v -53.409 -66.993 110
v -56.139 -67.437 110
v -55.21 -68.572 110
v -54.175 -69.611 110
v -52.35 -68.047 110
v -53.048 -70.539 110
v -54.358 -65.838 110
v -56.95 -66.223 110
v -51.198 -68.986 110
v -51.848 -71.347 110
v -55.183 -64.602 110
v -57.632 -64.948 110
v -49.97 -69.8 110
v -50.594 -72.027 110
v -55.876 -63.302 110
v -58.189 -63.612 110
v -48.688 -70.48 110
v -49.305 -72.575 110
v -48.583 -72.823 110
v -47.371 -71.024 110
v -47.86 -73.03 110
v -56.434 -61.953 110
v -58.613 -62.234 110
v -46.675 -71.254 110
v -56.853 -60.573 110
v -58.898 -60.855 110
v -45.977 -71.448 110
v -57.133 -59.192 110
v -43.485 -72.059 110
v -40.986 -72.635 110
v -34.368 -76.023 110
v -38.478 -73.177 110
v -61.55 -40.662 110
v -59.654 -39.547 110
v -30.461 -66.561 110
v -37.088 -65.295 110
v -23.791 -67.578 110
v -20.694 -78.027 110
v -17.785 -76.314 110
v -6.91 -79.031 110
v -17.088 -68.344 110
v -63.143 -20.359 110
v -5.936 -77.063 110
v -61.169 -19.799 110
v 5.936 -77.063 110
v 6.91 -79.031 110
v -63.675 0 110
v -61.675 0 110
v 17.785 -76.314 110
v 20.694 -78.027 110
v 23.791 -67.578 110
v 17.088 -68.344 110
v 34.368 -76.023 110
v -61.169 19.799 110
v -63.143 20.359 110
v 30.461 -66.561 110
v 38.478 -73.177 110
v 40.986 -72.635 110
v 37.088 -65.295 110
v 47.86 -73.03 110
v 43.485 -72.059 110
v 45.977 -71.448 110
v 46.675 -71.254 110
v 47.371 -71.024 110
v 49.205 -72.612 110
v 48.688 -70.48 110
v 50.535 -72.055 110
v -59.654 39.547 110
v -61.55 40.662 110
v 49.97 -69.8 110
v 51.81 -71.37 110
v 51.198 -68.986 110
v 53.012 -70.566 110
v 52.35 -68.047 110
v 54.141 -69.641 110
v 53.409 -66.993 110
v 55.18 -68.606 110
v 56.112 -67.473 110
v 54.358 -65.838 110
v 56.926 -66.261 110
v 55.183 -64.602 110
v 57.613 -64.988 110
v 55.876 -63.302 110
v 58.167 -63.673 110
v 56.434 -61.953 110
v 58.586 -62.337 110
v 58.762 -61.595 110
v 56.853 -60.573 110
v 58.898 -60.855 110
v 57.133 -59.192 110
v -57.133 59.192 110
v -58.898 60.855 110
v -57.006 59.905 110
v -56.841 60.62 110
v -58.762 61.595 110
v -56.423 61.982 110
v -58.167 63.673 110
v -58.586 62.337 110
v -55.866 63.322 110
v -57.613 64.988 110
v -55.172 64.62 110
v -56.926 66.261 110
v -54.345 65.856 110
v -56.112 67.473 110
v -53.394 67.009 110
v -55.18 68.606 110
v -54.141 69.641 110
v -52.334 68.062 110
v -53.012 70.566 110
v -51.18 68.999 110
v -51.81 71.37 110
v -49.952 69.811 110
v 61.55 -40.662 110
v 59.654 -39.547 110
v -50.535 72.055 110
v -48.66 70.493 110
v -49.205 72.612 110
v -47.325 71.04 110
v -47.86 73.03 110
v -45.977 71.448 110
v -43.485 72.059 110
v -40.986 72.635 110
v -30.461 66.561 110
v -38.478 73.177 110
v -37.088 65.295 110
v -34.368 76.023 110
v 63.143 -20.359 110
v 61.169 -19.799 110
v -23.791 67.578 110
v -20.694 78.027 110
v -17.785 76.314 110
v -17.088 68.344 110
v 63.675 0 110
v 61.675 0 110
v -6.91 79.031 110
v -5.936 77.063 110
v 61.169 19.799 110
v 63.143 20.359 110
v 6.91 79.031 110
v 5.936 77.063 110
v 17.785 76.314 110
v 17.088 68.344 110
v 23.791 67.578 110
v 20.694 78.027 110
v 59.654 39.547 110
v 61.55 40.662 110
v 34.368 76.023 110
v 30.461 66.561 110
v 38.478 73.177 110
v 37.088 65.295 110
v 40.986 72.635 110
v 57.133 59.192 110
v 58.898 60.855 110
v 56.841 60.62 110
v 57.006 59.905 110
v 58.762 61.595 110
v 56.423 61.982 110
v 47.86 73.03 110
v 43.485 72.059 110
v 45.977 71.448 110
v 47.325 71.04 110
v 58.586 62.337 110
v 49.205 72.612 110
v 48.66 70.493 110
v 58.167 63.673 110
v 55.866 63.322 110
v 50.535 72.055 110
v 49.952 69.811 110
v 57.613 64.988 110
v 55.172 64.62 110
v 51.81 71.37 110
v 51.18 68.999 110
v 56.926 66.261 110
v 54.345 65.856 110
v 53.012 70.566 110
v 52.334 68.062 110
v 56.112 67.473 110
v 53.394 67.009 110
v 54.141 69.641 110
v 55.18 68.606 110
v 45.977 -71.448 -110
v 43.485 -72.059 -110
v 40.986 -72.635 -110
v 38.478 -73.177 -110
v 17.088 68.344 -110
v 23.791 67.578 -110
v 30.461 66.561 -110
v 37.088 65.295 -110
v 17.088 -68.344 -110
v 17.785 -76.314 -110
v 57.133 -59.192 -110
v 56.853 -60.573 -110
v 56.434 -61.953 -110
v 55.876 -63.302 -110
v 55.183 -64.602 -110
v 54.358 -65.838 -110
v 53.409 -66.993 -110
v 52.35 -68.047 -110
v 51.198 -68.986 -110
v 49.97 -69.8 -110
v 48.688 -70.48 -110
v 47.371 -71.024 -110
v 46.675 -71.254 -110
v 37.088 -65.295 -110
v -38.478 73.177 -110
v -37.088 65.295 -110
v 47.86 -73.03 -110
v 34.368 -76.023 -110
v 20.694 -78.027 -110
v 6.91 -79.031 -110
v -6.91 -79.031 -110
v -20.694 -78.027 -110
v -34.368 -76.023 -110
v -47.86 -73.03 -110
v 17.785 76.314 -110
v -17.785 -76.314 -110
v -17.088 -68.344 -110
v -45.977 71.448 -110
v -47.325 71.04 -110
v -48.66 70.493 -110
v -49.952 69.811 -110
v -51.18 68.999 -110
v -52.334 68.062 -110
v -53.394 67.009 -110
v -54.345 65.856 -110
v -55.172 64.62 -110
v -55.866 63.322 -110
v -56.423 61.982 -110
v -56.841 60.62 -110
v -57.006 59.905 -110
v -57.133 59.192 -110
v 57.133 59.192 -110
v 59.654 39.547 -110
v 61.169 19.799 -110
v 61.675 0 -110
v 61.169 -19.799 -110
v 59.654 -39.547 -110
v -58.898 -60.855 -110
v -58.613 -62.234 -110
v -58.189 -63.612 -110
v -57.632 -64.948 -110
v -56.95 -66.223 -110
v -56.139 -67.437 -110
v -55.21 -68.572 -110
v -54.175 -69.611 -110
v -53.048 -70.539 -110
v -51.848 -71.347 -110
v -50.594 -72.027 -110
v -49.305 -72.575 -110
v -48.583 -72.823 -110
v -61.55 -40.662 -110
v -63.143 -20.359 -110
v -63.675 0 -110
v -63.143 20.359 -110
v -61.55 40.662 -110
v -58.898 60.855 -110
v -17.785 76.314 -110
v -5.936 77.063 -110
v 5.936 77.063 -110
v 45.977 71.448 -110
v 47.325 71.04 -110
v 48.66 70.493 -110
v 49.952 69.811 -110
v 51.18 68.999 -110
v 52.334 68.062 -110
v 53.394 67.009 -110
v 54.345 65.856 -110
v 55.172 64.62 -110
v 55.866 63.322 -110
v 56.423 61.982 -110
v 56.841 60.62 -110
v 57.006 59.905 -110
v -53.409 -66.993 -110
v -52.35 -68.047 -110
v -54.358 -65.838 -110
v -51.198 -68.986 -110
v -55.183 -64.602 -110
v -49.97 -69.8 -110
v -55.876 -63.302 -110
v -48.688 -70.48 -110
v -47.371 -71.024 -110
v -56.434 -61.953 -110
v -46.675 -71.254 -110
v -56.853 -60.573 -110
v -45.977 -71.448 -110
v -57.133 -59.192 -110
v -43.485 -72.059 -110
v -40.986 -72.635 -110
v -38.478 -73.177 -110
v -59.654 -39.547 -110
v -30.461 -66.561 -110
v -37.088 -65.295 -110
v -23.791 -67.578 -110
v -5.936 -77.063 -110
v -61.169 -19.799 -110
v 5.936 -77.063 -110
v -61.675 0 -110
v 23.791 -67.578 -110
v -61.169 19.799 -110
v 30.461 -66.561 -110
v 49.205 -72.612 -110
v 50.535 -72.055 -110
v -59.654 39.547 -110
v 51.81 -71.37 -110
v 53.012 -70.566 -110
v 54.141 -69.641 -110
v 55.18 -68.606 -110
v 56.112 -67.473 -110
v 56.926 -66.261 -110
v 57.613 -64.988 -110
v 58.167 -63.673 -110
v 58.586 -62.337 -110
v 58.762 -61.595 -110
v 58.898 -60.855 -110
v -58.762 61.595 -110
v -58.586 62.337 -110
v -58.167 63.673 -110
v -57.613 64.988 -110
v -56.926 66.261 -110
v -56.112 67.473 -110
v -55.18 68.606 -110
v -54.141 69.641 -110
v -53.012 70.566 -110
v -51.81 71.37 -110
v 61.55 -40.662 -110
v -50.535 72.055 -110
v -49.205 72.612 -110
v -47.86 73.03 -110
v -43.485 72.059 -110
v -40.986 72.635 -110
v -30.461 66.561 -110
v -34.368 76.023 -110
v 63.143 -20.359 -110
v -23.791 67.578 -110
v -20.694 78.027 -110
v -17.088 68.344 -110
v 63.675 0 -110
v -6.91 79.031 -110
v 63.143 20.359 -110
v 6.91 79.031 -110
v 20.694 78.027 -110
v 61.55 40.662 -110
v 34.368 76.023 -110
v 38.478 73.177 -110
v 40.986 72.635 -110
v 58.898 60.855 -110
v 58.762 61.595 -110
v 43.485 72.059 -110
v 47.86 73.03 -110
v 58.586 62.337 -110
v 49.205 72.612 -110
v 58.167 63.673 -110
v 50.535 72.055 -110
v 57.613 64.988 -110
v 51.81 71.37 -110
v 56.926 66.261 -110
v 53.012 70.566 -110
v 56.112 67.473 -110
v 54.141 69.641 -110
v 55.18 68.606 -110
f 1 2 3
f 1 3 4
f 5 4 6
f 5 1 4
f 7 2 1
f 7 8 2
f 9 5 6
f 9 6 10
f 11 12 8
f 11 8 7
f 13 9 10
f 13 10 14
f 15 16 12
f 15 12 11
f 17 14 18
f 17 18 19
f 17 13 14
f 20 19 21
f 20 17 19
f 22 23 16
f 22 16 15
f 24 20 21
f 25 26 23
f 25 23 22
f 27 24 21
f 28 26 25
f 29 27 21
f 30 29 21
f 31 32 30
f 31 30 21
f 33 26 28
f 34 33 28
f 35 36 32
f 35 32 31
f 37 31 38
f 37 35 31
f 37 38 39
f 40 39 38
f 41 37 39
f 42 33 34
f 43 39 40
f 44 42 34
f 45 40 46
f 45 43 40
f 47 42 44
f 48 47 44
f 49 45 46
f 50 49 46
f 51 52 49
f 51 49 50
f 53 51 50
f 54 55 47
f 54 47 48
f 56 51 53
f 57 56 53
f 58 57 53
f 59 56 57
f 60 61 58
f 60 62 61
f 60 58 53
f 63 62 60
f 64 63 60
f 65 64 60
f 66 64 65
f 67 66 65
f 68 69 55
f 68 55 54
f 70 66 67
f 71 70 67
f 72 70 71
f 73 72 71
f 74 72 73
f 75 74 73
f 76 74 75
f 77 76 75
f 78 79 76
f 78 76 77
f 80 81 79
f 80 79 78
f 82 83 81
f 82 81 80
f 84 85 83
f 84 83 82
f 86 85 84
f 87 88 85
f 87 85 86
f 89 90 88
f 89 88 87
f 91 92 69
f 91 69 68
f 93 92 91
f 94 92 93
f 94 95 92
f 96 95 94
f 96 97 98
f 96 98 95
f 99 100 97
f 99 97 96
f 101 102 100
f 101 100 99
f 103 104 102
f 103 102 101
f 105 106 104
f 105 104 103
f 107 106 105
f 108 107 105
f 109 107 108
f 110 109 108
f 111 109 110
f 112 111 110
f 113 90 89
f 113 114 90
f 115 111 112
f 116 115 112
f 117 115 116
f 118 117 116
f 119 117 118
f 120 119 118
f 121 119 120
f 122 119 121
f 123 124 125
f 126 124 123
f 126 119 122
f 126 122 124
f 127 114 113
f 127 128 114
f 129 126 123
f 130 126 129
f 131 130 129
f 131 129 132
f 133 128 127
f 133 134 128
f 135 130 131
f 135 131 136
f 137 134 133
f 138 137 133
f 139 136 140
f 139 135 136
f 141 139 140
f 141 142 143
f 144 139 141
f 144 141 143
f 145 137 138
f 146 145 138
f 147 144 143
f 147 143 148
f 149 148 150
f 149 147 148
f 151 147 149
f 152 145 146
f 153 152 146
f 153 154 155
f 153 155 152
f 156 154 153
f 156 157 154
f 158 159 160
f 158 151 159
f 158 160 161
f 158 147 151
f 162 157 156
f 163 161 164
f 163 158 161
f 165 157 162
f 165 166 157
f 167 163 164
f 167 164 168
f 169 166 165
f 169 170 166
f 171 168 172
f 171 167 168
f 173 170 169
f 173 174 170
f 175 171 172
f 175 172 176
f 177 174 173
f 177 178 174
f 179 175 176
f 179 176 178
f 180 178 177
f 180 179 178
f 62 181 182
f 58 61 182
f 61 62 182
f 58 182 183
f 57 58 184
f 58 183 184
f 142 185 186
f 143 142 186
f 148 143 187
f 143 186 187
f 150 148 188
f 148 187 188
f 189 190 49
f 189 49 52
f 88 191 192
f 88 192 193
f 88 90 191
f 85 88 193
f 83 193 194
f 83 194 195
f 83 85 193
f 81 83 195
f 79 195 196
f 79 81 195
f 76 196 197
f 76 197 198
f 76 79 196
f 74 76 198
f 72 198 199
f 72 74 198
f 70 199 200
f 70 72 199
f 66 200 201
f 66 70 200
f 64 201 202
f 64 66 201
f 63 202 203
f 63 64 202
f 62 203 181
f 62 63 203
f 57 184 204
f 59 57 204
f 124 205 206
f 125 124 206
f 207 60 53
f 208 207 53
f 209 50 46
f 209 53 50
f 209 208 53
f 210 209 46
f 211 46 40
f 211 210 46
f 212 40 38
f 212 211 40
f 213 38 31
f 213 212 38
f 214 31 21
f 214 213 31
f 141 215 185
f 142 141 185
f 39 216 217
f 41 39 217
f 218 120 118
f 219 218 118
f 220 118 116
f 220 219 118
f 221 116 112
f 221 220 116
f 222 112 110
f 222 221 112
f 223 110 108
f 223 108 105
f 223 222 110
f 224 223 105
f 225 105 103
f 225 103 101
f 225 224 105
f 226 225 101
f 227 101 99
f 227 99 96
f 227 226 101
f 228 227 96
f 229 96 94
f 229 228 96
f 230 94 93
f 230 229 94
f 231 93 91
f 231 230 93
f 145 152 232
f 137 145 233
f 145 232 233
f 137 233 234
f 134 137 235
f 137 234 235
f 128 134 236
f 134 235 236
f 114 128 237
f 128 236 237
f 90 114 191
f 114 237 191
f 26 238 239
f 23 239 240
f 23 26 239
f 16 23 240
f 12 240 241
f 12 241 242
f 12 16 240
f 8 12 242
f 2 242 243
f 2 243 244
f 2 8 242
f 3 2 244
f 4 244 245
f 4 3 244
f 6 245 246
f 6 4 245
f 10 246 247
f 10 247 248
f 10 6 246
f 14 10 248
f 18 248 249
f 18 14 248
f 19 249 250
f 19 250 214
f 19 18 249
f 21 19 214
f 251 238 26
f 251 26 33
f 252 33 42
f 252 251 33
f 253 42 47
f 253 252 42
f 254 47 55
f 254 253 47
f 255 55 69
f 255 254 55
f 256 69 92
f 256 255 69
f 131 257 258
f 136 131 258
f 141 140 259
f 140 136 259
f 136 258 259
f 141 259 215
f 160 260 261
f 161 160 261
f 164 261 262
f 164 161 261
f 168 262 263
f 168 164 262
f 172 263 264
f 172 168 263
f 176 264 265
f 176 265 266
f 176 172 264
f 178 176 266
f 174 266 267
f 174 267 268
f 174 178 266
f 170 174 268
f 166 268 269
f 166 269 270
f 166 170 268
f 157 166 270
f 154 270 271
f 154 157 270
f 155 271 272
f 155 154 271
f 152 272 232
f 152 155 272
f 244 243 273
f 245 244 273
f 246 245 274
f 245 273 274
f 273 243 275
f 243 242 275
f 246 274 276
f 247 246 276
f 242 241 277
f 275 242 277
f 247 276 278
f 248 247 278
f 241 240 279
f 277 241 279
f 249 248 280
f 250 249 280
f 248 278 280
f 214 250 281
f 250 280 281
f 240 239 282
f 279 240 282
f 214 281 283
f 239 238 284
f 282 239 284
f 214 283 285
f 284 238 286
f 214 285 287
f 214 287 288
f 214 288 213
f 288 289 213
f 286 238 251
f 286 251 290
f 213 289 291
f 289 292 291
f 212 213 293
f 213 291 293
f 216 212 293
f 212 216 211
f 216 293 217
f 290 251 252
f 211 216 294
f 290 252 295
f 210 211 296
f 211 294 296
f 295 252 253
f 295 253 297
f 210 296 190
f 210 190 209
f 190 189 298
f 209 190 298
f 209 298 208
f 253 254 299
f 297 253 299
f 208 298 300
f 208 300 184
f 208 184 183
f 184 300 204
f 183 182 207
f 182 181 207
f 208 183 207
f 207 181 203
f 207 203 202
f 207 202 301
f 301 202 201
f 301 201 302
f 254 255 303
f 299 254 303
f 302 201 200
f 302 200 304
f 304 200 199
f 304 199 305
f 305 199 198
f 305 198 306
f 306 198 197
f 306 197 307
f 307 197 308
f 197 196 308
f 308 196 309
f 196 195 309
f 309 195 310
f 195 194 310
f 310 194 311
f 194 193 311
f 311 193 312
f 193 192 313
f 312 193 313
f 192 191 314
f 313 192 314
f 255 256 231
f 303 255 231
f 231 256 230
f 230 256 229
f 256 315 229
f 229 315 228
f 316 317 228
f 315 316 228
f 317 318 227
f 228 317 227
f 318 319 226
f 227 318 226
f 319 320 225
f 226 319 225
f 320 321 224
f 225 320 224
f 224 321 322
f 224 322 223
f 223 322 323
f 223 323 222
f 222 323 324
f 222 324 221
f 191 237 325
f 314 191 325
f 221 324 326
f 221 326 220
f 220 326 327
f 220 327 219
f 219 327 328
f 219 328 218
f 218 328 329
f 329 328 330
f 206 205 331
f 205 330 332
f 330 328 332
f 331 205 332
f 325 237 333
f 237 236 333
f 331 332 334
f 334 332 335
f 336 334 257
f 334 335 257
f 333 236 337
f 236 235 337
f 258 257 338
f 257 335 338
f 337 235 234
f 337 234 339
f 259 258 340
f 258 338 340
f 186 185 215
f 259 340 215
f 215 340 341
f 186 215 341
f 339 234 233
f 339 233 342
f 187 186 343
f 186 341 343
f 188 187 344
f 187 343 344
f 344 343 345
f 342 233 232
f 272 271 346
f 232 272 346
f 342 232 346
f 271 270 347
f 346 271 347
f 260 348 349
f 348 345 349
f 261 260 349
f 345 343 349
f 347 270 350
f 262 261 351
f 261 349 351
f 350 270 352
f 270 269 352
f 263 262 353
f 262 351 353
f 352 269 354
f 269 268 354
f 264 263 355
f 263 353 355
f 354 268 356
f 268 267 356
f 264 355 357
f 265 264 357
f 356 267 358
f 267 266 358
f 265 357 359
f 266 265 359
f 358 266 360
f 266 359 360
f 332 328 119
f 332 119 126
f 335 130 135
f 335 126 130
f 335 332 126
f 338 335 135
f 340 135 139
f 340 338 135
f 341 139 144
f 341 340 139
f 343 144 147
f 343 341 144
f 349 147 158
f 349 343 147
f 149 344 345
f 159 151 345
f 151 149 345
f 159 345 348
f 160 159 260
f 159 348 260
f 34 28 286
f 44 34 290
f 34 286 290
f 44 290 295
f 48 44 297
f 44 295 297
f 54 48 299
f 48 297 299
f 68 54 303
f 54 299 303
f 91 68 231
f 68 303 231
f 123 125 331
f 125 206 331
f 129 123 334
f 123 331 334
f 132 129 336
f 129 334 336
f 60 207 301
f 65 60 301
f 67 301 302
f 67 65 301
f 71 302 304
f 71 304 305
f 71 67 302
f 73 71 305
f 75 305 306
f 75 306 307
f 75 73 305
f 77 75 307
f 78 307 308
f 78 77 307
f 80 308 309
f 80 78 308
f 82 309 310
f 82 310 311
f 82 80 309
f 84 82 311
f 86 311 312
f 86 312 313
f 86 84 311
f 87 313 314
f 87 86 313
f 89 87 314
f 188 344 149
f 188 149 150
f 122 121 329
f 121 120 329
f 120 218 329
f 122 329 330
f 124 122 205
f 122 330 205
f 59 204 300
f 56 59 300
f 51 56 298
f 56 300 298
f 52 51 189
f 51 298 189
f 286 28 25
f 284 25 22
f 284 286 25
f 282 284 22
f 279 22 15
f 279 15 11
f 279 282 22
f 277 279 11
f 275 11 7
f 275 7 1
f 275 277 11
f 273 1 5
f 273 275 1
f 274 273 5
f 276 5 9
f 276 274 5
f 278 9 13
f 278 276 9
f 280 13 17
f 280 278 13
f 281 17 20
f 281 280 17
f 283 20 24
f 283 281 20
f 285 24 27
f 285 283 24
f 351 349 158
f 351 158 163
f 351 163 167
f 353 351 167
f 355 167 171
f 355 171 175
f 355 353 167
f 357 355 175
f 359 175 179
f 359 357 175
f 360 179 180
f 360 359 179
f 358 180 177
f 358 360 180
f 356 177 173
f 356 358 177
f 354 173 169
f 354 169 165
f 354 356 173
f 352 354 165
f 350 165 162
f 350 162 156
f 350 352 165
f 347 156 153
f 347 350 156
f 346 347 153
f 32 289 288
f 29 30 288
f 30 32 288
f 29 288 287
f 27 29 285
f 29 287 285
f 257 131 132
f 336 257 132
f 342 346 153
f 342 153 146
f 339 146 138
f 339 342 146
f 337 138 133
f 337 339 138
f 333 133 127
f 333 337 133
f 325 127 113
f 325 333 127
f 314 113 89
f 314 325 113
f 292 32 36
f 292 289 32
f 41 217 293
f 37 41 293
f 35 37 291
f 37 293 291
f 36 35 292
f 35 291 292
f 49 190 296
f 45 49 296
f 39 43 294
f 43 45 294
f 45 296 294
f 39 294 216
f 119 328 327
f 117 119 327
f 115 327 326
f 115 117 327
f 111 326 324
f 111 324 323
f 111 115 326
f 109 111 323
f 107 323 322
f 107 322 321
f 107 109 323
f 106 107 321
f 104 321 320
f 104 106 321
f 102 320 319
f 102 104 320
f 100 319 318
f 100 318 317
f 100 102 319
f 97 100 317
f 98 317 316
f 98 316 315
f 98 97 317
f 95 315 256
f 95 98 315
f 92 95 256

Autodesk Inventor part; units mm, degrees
ref_plane "YZ Plane" through (0, 0, 0) normal (1, 0, 0) x (0, 1, 0)
ref_plane "XZ Plane" through (0, 0, 0) normal (0, 1, 0) x (-1, 0, 0)
ref_plane "XY Plane" through (0, 0, 0) normal (0, 0, 1) x (1, 0, 0)
sketch "Sketch1" plane through (0, 0, 0) normal (0, 0, 1) x (1, 0, 0)
  line L0 (-57, -57.5) -> (57, 57.5) construction
  line L1 (-67.5, 67.5) -> (67.5, 67.5) construction
  line L2 (67.5, 67.5) -> (67.5, -67.5) construction
  line L3 (67.5, -67.5) -> (-67.5, -67.5) construction
  line L4 (-67.5, -67.5) -> (-67.5, 67.5) construction
  line L5 (-67.5, 67.5) -> (67.5, -67.5) construction
  line L6 (67.5, 67.5) -> (-67.5, -67.5) construction
  circle A0 centre (-37.5, 37.5) radius 4
  circle A1 centre (-37.5, -37.5) radius 4
  circle A2 centre (37.5, -37.5) radius 4
  circle A3 centre (37.5, 37.5) radius 4
  arc A4 (-48.5, 62.5) -> (-48.5, -62.5) centre (326.325, 0) ccw
  line L7 (0, 67.5) -> (0, -67.5) construction
  line L8 (67.5, -67.5) -> (67.5, 67.5) construction
  arc A5 (48.5, -62.5) -> (48.5, 62.5) centre (-326.325, 0) ccw
  arc A6 (48.5, 62.5) -> (-48.5, 62.5) centre (0, -110.8429) ccw
  line L9 (-67.5, 0) -> (53.675, 0) construction
  arc A7 (-48.5, -62.5) -> (48.5, -62.5) centre (0, 110.8429) ccw
  arc A8 (-30.7003, 46.1842) -> (-30.7003, -46.1842) centre (326.325, 0) ccw
  arc A9 (-30.7003, -46.1842) -> (30.7003, -46.1842) centre (0, 110.8429) ccw
  arc A10 (30.7003, -46.1842) -> (30.7003, 46.1842) centre (-326.325, 0) ccw
  arc A11 (30.7003, 46.1842) -> (-30.7003, 46.1842) centre (0, -110.8429) ccw
  arc A12 (-55.5322, 68.7683) -> (-55.5322, -68.7683) centre (326.325, 0) ccw
  arc A13 (-55.5322, -68.7683) -> (55.5322, -68.7683) centre (0, 110.8429) ccw
  arc A14 (55.5322, -68.7683) -> (55.5322, 68.7683) centre (-326.325, 0) ccw
  arc A15 (55.5322, 68.7683) -> (-55.5322, 68.7683) centre (0, -110.8429) ccw
  arc A16 (-57.2838, 70.3161) -> (-57.2838, -70.3161) centre (326.325, 0) ccw
  arc A17 (-57.2838, -70.3161) -> (57.2838, -70.3161) centre (0, 110.8429) ccw
  arc A18 (57.2838, -70.3161) -> (57.2838, 70.3161) centre (-326.325, 0) ccw
  arc A19 (57.2838, 70.3161) -> (-57.2838, 70.3161) centre (0, -110.8429) ccw
  line L10 (17.7854, 76.314) -> (17.0881, 68.3442)
  line L11 (38.478, 73.1774) -> (37.0881, 65.2948)
  line L12 (-17.7854, 76.314) -> (-17.0881, 68.3442)
  line L13 (-38.478, 73.1774) -> (-37.0881, 65.2948)
  line L14 (17.7854, -76.314) -> (17.0881, -68.3442)
  line L15 (38.478, -73.1774) -> (37.0881, -65.2948)
  line L16 (-38.478, -73.1774) -> (-37.0881, -65.2948)
  line L17 (-17.7854, -76.314) -> (-17.0881, -68.3442)
  point P0 (0, 0)
  point P1 (0, 0)
  point P2 (-53.675, 0)
  point P3 (0, 0)
  dimension "d3" = 135
  dimension "d4" = 135
  dimension "d5" = 8
  dimension "d9" = 360
  dimension "d29" = 75
  dimension "d30" = 125
  dimension "d31" = 97
  dimension "d32" = 180
  dimension "d33" = 380
  dimension "d34" = 20
  dimension "d36" = 8
  dimension "d37" = 2
  dimension "d38" = 5
  dimension "d39" = 20
  dimension "d41" = 5
extrude "Extrusion1" add sketch "Sketch1" along normal mid plane 220 contours L13 A15 L12 A6 | A7 L17 A13 L16 | L10 A15 L11 A6 | A7 L15 A13 L14 | A19 A18 A17 A16
fillet "Fillet2" radius 15 8 edges at (57.2838, 70.3161, 0) (-57.2838, 70.3161, 0) (-57.2838, -70.3161, 0) (57.2838, -70.3161, 0) (55.5322, -68.7683, 0) (-55.5322, -68.7683, 0) (-55.5322, 68.7683, 0) (55.5322, 68.7683, 0)
properties part number "lineaire as deel 2" material "Aluminum 6061"
